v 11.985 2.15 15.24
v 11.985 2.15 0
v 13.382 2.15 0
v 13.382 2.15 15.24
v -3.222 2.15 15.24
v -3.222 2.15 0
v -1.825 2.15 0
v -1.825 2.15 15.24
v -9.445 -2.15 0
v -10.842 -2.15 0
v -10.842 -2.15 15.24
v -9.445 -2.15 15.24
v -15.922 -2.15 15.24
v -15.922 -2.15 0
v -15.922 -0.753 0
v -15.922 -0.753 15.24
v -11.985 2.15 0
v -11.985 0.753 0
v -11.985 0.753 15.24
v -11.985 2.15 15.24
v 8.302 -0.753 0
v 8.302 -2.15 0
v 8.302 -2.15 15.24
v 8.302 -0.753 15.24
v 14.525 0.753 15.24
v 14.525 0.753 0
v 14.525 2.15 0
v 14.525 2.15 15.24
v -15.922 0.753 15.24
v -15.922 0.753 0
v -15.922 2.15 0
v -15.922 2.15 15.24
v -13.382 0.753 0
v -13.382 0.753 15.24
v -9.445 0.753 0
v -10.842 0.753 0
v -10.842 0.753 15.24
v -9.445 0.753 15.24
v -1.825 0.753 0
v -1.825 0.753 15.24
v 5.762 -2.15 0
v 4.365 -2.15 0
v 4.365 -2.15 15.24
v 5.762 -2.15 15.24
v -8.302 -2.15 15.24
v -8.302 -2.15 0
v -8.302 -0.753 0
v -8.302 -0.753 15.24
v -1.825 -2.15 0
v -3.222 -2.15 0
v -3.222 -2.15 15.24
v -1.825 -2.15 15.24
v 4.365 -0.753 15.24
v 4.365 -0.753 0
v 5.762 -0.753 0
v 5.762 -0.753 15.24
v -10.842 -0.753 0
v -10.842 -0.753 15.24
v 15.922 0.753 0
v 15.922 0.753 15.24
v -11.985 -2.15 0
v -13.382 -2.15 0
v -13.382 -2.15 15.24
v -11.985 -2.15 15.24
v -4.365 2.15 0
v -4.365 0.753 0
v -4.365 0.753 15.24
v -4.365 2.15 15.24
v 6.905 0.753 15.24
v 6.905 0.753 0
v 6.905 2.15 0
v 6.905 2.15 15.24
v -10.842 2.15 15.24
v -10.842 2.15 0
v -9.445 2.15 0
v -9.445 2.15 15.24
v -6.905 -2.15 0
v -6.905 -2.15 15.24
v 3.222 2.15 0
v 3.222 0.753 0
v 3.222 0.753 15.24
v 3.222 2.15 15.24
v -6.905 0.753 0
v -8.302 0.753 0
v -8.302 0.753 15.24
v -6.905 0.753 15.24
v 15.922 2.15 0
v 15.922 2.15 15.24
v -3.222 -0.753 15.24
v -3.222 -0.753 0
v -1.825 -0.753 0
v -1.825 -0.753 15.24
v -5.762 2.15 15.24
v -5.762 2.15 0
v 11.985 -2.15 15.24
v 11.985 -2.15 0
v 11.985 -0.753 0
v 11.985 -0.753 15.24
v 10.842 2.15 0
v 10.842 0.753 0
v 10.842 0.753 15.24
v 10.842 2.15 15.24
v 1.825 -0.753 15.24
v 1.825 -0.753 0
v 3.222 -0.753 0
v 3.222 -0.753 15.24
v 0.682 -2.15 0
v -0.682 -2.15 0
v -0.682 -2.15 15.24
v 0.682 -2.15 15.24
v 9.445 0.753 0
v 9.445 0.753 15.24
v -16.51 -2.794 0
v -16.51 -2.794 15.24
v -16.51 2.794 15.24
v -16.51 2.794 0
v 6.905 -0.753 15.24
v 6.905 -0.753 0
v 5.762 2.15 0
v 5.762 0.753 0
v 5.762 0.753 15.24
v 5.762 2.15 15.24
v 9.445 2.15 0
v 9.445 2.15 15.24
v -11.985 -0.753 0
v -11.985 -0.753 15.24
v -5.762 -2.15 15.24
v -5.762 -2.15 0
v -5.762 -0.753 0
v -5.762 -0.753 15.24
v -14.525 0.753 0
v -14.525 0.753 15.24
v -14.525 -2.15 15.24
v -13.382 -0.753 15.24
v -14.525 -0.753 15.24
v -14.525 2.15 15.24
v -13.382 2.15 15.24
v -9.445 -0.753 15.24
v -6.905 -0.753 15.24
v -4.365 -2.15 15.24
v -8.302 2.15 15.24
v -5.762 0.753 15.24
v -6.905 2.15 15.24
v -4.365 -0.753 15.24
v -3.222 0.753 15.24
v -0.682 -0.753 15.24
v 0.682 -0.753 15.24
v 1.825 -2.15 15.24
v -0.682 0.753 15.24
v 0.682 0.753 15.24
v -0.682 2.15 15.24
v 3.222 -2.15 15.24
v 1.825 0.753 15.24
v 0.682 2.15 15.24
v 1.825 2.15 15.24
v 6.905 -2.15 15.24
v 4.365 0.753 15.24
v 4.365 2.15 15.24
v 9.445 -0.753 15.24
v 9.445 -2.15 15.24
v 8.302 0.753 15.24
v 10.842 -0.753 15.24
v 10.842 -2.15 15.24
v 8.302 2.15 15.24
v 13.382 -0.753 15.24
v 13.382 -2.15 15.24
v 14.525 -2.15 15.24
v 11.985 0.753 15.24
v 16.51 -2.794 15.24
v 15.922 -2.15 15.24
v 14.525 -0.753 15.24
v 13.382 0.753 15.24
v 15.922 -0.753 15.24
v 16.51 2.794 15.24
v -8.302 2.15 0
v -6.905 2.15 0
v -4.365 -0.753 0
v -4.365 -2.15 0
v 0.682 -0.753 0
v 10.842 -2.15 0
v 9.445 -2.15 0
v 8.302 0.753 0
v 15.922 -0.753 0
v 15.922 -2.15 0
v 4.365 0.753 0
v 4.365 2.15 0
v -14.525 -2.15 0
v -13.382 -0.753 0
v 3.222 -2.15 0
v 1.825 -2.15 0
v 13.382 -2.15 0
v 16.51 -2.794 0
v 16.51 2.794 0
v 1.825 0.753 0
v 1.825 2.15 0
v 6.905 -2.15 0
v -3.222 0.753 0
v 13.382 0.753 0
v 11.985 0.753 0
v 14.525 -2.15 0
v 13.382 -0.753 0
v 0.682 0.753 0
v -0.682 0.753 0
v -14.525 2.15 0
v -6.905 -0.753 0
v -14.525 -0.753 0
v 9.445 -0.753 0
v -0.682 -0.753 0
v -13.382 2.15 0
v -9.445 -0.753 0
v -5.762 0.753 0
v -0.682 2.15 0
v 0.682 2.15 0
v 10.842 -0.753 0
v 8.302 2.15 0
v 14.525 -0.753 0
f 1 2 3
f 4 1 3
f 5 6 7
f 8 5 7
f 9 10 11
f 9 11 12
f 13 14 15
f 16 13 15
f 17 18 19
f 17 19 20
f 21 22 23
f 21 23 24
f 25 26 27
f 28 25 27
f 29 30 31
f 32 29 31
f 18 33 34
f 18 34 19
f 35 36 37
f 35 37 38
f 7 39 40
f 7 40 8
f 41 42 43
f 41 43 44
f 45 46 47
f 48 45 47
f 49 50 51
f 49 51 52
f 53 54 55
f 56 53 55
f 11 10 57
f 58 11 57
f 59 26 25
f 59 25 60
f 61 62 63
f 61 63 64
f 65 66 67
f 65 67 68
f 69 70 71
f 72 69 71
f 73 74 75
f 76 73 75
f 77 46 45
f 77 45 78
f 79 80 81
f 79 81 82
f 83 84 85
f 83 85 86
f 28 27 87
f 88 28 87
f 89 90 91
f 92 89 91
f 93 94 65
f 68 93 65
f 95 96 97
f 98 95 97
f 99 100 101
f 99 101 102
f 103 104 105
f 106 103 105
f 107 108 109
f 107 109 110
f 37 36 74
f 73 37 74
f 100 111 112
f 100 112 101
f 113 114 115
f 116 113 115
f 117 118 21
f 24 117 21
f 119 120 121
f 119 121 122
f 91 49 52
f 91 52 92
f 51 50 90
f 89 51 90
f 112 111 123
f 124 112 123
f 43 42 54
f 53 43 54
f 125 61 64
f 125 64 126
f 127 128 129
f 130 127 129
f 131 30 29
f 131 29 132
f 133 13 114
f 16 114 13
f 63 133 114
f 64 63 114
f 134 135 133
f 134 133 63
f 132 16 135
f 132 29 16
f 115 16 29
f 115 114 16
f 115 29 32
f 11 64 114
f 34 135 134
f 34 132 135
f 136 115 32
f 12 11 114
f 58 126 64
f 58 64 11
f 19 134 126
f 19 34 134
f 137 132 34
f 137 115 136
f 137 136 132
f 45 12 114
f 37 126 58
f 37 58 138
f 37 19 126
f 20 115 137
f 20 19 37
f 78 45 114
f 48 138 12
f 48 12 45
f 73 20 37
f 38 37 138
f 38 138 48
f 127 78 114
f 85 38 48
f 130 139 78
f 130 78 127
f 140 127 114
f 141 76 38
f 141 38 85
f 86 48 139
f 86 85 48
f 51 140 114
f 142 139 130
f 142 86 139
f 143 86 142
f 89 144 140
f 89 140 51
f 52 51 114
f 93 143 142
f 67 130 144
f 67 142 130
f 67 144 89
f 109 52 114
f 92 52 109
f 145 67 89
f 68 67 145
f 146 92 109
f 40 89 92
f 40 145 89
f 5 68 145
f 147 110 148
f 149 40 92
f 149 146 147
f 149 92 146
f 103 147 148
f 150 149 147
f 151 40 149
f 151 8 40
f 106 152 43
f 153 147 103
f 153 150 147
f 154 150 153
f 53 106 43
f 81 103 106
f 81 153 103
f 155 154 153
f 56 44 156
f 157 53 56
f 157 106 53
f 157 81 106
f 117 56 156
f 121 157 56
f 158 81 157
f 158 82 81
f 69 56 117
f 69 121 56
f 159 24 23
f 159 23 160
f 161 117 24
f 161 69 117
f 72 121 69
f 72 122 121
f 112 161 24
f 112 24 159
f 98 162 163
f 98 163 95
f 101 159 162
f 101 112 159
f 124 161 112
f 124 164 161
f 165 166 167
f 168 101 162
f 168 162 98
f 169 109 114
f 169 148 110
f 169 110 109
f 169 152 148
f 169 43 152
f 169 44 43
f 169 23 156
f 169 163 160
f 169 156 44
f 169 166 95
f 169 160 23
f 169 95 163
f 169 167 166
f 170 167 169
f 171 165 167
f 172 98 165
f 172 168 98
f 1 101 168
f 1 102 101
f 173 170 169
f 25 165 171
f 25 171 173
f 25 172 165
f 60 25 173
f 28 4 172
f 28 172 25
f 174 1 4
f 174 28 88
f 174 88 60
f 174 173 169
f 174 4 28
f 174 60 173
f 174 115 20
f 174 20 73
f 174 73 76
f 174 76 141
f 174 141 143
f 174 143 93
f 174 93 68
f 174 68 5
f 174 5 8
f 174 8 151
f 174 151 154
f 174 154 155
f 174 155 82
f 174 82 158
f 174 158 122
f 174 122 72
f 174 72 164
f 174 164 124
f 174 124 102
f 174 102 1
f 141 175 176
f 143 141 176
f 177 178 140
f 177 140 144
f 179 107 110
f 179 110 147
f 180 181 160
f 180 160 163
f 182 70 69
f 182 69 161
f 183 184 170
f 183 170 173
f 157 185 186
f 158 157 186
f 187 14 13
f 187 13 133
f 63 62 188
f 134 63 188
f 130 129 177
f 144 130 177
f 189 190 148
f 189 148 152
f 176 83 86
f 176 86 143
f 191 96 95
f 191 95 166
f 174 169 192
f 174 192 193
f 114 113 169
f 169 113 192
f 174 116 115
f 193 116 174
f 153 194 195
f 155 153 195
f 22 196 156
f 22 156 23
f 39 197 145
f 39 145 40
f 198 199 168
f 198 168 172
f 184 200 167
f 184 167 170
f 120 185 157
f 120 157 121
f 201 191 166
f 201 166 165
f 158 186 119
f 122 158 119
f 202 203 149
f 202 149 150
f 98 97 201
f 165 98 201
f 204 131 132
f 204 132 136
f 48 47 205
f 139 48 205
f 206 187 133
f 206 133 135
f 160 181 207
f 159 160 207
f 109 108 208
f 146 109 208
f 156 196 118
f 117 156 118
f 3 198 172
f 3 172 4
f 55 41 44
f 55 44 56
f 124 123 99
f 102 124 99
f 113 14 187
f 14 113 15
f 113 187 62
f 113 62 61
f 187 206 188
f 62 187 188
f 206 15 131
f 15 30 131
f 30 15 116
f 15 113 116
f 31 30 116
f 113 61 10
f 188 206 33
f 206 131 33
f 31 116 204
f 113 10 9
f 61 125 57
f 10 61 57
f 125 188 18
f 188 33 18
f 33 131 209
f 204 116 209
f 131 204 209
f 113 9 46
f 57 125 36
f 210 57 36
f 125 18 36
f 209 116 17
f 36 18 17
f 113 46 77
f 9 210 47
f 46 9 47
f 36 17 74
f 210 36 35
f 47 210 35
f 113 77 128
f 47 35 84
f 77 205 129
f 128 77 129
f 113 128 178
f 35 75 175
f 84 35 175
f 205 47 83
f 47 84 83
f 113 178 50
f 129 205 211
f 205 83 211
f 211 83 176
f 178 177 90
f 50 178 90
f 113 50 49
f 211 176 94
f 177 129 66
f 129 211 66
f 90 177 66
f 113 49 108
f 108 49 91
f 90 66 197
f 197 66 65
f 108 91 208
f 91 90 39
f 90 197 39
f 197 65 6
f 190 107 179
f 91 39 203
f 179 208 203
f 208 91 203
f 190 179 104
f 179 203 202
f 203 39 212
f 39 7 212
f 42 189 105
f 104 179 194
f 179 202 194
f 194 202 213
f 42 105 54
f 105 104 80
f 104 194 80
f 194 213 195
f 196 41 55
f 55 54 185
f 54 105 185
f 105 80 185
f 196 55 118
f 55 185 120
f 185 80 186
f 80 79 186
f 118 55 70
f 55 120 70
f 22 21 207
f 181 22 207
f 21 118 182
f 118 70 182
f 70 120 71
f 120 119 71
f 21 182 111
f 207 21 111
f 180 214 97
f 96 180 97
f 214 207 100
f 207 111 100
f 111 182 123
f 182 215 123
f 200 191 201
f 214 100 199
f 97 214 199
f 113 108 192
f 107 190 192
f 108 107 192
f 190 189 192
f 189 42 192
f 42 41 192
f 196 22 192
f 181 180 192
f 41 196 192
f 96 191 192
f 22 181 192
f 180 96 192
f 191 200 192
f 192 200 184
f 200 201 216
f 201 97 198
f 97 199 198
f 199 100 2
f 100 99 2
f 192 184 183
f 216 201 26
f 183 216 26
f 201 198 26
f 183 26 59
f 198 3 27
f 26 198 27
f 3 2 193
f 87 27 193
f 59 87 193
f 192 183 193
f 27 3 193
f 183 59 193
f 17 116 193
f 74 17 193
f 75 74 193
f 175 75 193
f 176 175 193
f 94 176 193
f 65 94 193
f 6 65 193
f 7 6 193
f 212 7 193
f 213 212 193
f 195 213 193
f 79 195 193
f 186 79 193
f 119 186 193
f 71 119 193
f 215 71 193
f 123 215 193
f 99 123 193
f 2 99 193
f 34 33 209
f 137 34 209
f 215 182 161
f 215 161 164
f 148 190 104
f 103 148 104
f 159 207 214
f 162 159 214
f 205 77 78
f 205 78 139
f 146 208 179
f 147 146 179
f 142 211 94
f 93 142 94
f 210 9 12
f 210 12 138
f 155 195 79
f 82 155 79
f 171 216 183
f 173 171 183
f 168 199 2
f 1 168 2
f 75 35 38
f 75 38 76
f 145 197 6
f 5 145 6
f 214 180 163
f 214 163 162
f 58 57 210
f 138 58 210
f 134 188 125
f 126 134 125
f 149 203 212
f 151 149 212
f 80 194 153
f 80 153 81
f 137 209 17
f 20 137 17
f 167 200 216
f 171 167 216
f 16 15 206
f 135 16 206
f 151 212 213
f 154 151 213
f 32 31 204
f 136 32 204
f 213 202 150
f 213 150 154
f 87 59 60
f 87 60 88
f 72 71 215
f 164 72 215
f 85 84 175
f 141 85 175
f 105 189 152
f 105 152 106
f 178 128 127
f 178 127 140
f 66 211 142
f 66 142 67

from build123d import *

# Parameters (mm, degrees)
SKETCH1_W           = 33.02
SKETCH1_H           = 5.588
SKETCH1_W_2         = 1.397
SKETCH1_H_2         = 1.397
SKETCH1_W_3         = 1.364533422
BOSS_EXTRUDE1_DEPTH = 15.24


with BuildPart() as part:
    # Sketch1 → Boss-Extrude1 (new body)
    with BuildSketch(Plane.XY):
        Rectangle(SKETCH1_W, SKETCH1_H)
        with Locations((2.523766711, -1.451626982)):
            Rectangle(SKETCH1_W_2, SKETCH1_H_2, mode=Mode.SUBTRACT)
        with Locations((0, -1.451626982)):
            Rectangle(SKETCH1_W_3, SKETCH1_H_2, mode=Mode.SUBTRACT)
        with Locations((5.063766711, -1.451626982)):
            Rectangle(SKETCH1_W_2, SKETCH1_H_2, mode=Mode.SUBTRACT)
        with Locations((7.603766711, -1.451626982)):
            Rectangle(SKETCH1_W_2, SKETCH1_H_2, mode=Mode.SUBTRACT)
        with Locations((10.143766711, -1.451626982)):
            Rectangle(SKETCH1_W_2, SKETCH1_H_2, mode=Mode.SUBTRACT)
        with Locations((12.683766711, -1.451626982)):
            Rectangle(SKETCH1_W_2, SKETCH1_H_2, mode=Mode.SUBTRACT)
        with Locations((15.223766711, -1.451626982)):
            Rectangle(SKETCH1_W_2, SKETCH1_H_2, mode=Mode.SUBTRACT)
        with Locations((-15.223766711, -1.451626982)):
            Rectangle(SKETCH1_W_2, SKETCH1_H_2, mode=Mode.SUBTRACT)
        with Locations((-12.683766711, -1.451626982)):
            Rectangle(SKETCH1_W_2, SKETCH1_H_2, mode=Mode.SUBTRACT)
        with Locations((-10.143766711, -1.451626982)):
            Rectangle(SKETCH1_W_2, SKETCH1_H_2, mode=Mode.SUBTRACT)
        with Locations((-7.603766711, -1.451626982)):
            Rectangle(SKETCH1_W_2, SKETCH1_H_2, mode=Mode.SUBTRACT)
        with Locations((-5.063766711, -1.451626982)):
            Rectangle(SKETCH1_W_2, SKETCH1_H_2, mode=Mode.SUBTRACT)
        with Locations((-2.523766711, -1.451626982)):
            Rectangle(SKETCH1_W_2, SKETCH1_H_2, mode=Mode.SUBTRACT)
        with Locations((-2.523766711, 1.451626982)):
            Rectangle(SKETCH1_W_2, SKETCH1_H_2, mode=Mode.SUBTRACT)
        with Locations((0, 1.451626982)):
            Rectangle(SKETCH1_W_3, SKETCH1_H_2, mode=Mode.SUBTRACT)
        with Locations((-5.063766711, 1.451626982)):
            Rectangle(SKETCH1_W_2, SKETCH1_H_2, mode=Mode.SUBTRACT)
        with Locations((-7.603766711, 1.451626982)):
            Rectangle(SKETCH1_W_2, SKETCH1_H_2, mode=Mode.SUBTRACT)
        with Locations((-10.143766711, 1.451626982)):
            Rectangle(SKETCH1_W_2, SKETCH1_H_2, mode=Mode.SUBTRACT)
        with Locations((-12.683766711, 1.451626982)):
            Rectangle(SKETCH1_W_2, SKETCH1_H_2, mode=Mode.SUBTRACT)
        with Locations((-15.223766711, 1.451626982)):
            Rectangle(SKETCH1_W_2, SKETCH1_H_2, mode=Mode.SUBTRACT)
        with Locations((15.223766711, 1.451626982)):
            Rectangle(SKETCH1_W_2, SKETCH1_H_2, mode=Mode.SUBTRACT)
        with Locations((12.683766711, 1.451626982)):
            Rectangle(SKETCH1_W_2, SKETCH1_H_2, mode=Mode.SUBTRACT)
        with Locations((10.143766711, 1.451626982)):
            Rectangle(SKETCH1_W_2, SKETCH1_H_2, mode=Mode.SUBTRACT)
        with Locations((7.603766711, 1.451626982)):
            Rectangle(SKETCH1_W_2, SKETCH1_H_2, mode=Mode.SUBTRACT)
        with Locations((5.063766711, 1.451626982)):
            Rectangle(SKETCH1_W_2, SKETCH1_H_2, mode=Mode.SUBTRACT)
        with Locations((2.523766711, 1.451626982)):
            Rectangle(SKETCH1_W_2, SKETCH1_H_2, mode=Mode.SUBTRACT)
    extrude(amount=BOSS_EXTRUDE1_DEPTH)


solid = part.part
